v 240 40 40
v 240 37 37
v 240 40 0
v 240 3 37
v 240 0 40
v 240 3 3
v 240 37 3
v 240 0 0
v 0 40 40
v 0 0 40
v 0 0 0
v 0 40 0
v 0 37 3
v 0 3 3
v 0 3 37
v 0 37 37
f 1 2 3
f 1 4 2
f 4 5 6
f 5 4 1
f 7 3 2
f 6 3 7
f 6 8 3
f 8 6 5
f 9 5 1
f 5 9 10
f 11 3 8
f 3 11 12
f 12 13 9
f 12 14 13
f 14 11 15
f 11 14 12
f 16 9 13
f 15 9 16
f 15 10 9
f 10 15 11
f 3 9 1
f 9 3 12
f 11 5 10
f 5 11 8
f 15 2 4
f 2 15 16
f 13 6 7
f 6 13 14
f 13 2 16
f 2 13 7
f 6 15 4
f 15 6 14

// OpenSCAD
$fn = 32;

// ----------------------------------------------------------------------
// Box beam: 200-250 mm hollow beam
// ----------------------------------------------------------------------

// --- parameters (mm) ---
beam_l = 240;             // beam length, X
beam_w = 40;              // beam width, Y
beam_h = 40;              // beam height, Z
wall = 3;                 // wall thickness

difference() {
  cube([beam_l, beam_w, beam_h]);
  translate([-1, wall, wall])
    cube([beam_l + 2, beam_w - 2 * wall, beam_h - 2 * wall]);
}
